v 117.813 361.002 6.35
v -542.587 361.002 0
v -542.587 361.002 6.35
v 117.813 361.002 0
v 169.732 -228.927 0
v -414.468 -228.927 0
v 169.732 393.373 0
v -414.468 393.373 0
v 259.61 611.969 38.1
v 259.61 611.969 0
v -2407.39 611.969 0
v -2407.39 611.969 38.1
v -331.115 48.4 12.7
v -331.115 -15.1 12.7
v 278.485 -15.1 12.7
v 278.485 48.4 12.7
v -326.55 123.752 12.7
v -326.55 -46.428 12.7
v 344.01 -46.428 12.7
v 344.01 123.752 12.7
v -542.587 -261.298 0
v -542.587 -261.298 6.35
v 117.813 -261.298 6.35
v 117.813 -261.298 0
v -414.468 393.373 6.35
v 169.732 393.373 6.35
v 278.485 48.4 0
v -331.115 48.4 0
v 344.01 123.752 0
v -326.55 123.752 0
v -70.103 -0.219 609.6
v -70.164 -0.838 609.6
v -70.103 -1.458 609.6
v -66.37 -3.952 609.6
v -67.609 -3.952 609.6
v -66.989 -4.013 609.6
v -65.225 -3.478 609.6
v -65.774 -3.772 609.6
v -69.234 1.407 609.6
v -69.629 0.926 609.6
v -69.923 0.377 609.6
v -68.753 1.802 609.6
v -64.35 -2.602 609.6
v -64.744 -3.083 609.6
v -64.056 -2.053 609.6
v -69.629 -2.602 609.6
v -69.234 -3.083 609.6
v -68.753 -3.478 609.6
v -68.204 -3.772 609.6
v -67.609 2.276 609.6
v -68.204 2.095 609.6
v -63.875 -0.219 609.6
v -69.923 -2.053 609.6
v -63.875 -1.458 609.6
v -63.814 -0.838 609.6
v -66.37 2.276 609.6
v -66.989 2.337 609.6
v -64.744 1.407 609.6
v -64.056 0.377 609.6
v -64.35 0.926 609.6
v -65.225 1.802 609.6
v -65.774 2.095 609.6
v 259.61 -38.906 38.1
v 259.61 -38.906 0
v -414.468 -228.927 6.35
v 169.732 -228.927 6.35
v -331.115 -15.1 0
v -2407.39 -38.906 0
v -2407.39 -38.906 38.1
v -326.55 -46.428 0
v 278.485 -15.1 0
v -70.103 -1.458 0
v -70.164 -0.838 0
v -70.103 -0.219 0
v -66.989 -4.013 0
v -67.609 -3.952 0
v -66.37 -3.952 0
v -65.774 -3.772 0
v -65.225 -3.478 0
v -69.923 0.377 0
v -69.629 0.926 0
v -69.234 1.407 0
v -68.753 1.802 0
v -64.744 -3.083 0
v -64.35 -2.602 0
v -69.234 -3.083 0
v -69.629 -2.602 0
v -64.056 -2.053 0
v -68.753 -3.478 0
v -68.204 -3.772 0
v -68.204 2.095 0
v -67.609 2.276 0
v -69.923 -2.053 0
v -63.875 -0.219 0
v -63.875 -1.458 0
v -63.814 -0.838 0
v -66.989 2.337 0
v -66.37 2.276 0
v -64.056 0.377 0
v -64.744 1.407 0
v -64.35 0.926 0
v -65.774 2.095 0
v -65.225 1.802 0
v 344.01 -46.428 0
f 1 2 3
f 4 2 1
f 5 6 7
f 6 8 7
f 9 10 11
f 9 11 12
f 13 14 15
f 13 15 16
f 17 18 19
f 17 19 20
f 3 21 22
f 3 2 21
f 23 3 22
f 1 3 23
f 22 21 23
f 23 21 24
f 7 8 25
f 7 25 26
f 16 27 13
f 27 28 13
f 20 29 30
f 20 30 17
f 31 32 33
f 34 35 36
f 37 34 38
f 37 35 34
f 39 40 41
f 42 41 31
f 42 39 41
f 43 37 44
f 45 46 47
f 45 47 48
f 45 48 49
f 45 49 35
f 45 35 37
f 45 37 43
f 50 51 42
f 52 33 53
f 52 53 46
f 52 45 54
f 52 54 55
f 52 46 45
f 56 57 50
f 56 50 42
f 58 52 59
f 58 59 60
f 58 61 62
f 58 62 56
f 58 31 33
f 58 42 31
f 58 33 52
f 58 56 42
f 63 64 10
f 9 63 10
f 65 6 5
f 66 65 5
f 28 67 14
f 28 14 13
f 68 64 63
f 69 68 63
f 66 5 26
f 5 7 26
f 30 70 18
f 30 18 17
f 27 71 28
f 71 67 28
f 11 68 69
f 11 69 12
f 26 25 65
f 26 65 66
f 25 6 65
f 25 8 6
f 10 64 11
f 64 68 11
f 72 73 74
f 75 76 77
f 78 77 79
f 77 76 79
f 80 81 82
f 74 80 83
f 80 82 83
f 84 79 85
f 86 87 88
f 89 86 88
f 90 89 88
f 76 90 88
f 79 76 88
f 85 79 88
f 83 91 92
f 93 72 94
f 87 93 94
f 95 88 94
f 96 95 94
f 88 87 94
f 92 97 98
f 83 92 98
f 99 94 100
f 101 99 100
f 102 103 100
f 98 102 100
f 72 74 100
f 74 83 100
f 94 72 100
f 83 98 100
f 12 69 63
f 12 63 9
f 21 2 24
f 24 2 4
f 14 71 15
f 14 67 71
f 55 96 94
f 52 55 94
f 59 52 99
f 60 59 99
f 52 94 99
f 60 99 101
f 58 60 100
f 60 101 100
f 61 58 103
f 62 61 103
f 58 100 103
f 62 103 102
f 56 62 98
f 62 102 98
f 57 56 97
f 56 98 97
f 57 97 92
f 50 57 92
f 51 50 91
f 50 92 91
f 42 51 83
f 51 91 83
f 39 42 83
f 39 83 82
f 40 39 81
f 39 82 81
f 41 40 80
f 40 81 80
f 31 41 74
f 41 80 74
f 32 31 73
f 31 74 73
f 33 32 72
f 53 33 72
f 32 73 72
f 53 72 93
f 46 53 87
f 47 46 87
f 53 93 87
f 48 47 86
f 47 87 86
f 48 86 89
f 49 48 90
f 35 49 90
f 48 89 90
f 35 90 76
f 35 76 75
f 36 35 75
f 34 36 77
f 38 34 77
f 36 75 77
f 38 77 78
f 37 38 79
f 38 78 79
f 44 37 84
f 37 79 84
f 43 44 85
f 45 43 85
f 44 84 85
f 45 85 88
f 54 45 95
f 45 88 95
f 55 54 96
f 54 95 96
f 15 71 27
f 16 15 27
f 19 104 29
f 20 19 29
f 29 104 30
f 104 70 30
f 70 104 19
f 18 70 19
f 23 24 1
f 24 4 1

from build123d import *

# Parameters (mm, degrees)
F0_W      = 2489.2
F0_H      = 650.875
F1_DEPTH  = 38.1
F2_W      = 431.8
F2_H      = 63.5
F3_DEPTH  = 12.7
F4_W      = 492.76
F4_H      = 170.18
F5_DEPTH  = 12.7
F6_W      = 584.2
F6_H      = 444.5
F7_DEPTH  = 6.35
F8_W      = 660.4
F8_H      = 444.5
F9_DEPTH  = 6.35
F10_R     = 3.175
F11_DEPTH = 609.6
F12_DEPTH = 177.8
F13_DEPTH = 177.8
F14_DEPTH = 177.8
F15_DEPTH = 177.8
F16_DEPTH = 177.8


with BuildPart() as f1:
    # F0 (on Top) → F1 (new body)
    with BuildSketch(Plane.XY):
        with Locations((-1162.7904420257, 286.5318235457)):
            Rectangle(F0_W, F0_H)
    extrude(amount=F1_DEPTH)

    # F16 (add): a face of the model
    f16_faces = [f1.faces().sort_by_distance(p)[0] for p in [
        (81.8095579743, 286.5318235457, 19.05),
    ]]
    extrude(f16_faces, amount=F16_DEPTH)


with BuildPart() as f3:
    # F2 (on Top) → F3 (new body)
    with BuildSketch(Plane.XY):
        with Locations((-115.2146345019, 16.6498486996)):
            Rectangle(F2_W, F2_H)
    extrude(amount=F3_DEPTH)

    # F15 (add): a face of the model
    f15_faces = [f3.faces().sort_by_distance(p)[0] for p in [
        (100.6853654981, 16.6498486996, 6.35),
    ]]
    extrude(f15_faces, amount=F15_DEPTH)


with BuildPart() as f5:
    # F4 (on Top) → F5 (new body)
    with BuildSketch(Plane.XY):
        with Locations((-80.1701629591, 38.6617330873)):
            Rectangle(F4_W, F4_H)
    extrude(amount=F5_DEPTH)

    # F14 (add): a face of the model
    f14_faces = [f5.faces().sort_by_distance(p)[0] for p in [
        (166.2098370409, 38.6617330873, 6.35),
    ]]
    extrude(f14_faces, amount=F14_DEPTH)


with BuildPart() as f7:
    # F6 (on Top) → F7 (new body)
    with BuildSketch(Plane.XY):
        with Locations((-122.3678465843, 171.1233187318)):
            Rectangle(F6_W, F6_H)
    extrude(amount=F7_DEPTH)

    # F13 (add): a face of the model
    f13_faces = [f7.faces().sort_by_distance(p)[0] for p in [
        (-122.3678465843, -51.1266812682, 3.175),
    ]]
    extrude(f13_faces, amount=F13_DEPTH)


with BuildPart() as f9:
    # F8 (on Top) → F9 (new body)
    with BuildSketch(Plane.XY):
        with Locations((-212.3867182851, 138.7516189218)):
            Rectangle(F8_W, F8_H)
    extrude(amount=F9_DEPTH)

    # F12 (add): a face of the model
    f12_faces = [f9.faces().sort_by_distance(p)[0] for p in [
        (-212.3867182851, -83.4983810782, 3.175),
    ]]
    extrude(f12_faces, amount=F12_DEPTH)


with BuildPart() as f11:
    # F10 (on Top) → F11 (new body)
    with BuildSketch(Plane.XY):
        with Locations((-66.9894292951, -0.838244101)):
            Circle(F10_R)
    extrude(amount=F11_DEPTH)


solid = Compound([f1.part, f3.part, f5.part, f7.part, f9.part, f11.part])
